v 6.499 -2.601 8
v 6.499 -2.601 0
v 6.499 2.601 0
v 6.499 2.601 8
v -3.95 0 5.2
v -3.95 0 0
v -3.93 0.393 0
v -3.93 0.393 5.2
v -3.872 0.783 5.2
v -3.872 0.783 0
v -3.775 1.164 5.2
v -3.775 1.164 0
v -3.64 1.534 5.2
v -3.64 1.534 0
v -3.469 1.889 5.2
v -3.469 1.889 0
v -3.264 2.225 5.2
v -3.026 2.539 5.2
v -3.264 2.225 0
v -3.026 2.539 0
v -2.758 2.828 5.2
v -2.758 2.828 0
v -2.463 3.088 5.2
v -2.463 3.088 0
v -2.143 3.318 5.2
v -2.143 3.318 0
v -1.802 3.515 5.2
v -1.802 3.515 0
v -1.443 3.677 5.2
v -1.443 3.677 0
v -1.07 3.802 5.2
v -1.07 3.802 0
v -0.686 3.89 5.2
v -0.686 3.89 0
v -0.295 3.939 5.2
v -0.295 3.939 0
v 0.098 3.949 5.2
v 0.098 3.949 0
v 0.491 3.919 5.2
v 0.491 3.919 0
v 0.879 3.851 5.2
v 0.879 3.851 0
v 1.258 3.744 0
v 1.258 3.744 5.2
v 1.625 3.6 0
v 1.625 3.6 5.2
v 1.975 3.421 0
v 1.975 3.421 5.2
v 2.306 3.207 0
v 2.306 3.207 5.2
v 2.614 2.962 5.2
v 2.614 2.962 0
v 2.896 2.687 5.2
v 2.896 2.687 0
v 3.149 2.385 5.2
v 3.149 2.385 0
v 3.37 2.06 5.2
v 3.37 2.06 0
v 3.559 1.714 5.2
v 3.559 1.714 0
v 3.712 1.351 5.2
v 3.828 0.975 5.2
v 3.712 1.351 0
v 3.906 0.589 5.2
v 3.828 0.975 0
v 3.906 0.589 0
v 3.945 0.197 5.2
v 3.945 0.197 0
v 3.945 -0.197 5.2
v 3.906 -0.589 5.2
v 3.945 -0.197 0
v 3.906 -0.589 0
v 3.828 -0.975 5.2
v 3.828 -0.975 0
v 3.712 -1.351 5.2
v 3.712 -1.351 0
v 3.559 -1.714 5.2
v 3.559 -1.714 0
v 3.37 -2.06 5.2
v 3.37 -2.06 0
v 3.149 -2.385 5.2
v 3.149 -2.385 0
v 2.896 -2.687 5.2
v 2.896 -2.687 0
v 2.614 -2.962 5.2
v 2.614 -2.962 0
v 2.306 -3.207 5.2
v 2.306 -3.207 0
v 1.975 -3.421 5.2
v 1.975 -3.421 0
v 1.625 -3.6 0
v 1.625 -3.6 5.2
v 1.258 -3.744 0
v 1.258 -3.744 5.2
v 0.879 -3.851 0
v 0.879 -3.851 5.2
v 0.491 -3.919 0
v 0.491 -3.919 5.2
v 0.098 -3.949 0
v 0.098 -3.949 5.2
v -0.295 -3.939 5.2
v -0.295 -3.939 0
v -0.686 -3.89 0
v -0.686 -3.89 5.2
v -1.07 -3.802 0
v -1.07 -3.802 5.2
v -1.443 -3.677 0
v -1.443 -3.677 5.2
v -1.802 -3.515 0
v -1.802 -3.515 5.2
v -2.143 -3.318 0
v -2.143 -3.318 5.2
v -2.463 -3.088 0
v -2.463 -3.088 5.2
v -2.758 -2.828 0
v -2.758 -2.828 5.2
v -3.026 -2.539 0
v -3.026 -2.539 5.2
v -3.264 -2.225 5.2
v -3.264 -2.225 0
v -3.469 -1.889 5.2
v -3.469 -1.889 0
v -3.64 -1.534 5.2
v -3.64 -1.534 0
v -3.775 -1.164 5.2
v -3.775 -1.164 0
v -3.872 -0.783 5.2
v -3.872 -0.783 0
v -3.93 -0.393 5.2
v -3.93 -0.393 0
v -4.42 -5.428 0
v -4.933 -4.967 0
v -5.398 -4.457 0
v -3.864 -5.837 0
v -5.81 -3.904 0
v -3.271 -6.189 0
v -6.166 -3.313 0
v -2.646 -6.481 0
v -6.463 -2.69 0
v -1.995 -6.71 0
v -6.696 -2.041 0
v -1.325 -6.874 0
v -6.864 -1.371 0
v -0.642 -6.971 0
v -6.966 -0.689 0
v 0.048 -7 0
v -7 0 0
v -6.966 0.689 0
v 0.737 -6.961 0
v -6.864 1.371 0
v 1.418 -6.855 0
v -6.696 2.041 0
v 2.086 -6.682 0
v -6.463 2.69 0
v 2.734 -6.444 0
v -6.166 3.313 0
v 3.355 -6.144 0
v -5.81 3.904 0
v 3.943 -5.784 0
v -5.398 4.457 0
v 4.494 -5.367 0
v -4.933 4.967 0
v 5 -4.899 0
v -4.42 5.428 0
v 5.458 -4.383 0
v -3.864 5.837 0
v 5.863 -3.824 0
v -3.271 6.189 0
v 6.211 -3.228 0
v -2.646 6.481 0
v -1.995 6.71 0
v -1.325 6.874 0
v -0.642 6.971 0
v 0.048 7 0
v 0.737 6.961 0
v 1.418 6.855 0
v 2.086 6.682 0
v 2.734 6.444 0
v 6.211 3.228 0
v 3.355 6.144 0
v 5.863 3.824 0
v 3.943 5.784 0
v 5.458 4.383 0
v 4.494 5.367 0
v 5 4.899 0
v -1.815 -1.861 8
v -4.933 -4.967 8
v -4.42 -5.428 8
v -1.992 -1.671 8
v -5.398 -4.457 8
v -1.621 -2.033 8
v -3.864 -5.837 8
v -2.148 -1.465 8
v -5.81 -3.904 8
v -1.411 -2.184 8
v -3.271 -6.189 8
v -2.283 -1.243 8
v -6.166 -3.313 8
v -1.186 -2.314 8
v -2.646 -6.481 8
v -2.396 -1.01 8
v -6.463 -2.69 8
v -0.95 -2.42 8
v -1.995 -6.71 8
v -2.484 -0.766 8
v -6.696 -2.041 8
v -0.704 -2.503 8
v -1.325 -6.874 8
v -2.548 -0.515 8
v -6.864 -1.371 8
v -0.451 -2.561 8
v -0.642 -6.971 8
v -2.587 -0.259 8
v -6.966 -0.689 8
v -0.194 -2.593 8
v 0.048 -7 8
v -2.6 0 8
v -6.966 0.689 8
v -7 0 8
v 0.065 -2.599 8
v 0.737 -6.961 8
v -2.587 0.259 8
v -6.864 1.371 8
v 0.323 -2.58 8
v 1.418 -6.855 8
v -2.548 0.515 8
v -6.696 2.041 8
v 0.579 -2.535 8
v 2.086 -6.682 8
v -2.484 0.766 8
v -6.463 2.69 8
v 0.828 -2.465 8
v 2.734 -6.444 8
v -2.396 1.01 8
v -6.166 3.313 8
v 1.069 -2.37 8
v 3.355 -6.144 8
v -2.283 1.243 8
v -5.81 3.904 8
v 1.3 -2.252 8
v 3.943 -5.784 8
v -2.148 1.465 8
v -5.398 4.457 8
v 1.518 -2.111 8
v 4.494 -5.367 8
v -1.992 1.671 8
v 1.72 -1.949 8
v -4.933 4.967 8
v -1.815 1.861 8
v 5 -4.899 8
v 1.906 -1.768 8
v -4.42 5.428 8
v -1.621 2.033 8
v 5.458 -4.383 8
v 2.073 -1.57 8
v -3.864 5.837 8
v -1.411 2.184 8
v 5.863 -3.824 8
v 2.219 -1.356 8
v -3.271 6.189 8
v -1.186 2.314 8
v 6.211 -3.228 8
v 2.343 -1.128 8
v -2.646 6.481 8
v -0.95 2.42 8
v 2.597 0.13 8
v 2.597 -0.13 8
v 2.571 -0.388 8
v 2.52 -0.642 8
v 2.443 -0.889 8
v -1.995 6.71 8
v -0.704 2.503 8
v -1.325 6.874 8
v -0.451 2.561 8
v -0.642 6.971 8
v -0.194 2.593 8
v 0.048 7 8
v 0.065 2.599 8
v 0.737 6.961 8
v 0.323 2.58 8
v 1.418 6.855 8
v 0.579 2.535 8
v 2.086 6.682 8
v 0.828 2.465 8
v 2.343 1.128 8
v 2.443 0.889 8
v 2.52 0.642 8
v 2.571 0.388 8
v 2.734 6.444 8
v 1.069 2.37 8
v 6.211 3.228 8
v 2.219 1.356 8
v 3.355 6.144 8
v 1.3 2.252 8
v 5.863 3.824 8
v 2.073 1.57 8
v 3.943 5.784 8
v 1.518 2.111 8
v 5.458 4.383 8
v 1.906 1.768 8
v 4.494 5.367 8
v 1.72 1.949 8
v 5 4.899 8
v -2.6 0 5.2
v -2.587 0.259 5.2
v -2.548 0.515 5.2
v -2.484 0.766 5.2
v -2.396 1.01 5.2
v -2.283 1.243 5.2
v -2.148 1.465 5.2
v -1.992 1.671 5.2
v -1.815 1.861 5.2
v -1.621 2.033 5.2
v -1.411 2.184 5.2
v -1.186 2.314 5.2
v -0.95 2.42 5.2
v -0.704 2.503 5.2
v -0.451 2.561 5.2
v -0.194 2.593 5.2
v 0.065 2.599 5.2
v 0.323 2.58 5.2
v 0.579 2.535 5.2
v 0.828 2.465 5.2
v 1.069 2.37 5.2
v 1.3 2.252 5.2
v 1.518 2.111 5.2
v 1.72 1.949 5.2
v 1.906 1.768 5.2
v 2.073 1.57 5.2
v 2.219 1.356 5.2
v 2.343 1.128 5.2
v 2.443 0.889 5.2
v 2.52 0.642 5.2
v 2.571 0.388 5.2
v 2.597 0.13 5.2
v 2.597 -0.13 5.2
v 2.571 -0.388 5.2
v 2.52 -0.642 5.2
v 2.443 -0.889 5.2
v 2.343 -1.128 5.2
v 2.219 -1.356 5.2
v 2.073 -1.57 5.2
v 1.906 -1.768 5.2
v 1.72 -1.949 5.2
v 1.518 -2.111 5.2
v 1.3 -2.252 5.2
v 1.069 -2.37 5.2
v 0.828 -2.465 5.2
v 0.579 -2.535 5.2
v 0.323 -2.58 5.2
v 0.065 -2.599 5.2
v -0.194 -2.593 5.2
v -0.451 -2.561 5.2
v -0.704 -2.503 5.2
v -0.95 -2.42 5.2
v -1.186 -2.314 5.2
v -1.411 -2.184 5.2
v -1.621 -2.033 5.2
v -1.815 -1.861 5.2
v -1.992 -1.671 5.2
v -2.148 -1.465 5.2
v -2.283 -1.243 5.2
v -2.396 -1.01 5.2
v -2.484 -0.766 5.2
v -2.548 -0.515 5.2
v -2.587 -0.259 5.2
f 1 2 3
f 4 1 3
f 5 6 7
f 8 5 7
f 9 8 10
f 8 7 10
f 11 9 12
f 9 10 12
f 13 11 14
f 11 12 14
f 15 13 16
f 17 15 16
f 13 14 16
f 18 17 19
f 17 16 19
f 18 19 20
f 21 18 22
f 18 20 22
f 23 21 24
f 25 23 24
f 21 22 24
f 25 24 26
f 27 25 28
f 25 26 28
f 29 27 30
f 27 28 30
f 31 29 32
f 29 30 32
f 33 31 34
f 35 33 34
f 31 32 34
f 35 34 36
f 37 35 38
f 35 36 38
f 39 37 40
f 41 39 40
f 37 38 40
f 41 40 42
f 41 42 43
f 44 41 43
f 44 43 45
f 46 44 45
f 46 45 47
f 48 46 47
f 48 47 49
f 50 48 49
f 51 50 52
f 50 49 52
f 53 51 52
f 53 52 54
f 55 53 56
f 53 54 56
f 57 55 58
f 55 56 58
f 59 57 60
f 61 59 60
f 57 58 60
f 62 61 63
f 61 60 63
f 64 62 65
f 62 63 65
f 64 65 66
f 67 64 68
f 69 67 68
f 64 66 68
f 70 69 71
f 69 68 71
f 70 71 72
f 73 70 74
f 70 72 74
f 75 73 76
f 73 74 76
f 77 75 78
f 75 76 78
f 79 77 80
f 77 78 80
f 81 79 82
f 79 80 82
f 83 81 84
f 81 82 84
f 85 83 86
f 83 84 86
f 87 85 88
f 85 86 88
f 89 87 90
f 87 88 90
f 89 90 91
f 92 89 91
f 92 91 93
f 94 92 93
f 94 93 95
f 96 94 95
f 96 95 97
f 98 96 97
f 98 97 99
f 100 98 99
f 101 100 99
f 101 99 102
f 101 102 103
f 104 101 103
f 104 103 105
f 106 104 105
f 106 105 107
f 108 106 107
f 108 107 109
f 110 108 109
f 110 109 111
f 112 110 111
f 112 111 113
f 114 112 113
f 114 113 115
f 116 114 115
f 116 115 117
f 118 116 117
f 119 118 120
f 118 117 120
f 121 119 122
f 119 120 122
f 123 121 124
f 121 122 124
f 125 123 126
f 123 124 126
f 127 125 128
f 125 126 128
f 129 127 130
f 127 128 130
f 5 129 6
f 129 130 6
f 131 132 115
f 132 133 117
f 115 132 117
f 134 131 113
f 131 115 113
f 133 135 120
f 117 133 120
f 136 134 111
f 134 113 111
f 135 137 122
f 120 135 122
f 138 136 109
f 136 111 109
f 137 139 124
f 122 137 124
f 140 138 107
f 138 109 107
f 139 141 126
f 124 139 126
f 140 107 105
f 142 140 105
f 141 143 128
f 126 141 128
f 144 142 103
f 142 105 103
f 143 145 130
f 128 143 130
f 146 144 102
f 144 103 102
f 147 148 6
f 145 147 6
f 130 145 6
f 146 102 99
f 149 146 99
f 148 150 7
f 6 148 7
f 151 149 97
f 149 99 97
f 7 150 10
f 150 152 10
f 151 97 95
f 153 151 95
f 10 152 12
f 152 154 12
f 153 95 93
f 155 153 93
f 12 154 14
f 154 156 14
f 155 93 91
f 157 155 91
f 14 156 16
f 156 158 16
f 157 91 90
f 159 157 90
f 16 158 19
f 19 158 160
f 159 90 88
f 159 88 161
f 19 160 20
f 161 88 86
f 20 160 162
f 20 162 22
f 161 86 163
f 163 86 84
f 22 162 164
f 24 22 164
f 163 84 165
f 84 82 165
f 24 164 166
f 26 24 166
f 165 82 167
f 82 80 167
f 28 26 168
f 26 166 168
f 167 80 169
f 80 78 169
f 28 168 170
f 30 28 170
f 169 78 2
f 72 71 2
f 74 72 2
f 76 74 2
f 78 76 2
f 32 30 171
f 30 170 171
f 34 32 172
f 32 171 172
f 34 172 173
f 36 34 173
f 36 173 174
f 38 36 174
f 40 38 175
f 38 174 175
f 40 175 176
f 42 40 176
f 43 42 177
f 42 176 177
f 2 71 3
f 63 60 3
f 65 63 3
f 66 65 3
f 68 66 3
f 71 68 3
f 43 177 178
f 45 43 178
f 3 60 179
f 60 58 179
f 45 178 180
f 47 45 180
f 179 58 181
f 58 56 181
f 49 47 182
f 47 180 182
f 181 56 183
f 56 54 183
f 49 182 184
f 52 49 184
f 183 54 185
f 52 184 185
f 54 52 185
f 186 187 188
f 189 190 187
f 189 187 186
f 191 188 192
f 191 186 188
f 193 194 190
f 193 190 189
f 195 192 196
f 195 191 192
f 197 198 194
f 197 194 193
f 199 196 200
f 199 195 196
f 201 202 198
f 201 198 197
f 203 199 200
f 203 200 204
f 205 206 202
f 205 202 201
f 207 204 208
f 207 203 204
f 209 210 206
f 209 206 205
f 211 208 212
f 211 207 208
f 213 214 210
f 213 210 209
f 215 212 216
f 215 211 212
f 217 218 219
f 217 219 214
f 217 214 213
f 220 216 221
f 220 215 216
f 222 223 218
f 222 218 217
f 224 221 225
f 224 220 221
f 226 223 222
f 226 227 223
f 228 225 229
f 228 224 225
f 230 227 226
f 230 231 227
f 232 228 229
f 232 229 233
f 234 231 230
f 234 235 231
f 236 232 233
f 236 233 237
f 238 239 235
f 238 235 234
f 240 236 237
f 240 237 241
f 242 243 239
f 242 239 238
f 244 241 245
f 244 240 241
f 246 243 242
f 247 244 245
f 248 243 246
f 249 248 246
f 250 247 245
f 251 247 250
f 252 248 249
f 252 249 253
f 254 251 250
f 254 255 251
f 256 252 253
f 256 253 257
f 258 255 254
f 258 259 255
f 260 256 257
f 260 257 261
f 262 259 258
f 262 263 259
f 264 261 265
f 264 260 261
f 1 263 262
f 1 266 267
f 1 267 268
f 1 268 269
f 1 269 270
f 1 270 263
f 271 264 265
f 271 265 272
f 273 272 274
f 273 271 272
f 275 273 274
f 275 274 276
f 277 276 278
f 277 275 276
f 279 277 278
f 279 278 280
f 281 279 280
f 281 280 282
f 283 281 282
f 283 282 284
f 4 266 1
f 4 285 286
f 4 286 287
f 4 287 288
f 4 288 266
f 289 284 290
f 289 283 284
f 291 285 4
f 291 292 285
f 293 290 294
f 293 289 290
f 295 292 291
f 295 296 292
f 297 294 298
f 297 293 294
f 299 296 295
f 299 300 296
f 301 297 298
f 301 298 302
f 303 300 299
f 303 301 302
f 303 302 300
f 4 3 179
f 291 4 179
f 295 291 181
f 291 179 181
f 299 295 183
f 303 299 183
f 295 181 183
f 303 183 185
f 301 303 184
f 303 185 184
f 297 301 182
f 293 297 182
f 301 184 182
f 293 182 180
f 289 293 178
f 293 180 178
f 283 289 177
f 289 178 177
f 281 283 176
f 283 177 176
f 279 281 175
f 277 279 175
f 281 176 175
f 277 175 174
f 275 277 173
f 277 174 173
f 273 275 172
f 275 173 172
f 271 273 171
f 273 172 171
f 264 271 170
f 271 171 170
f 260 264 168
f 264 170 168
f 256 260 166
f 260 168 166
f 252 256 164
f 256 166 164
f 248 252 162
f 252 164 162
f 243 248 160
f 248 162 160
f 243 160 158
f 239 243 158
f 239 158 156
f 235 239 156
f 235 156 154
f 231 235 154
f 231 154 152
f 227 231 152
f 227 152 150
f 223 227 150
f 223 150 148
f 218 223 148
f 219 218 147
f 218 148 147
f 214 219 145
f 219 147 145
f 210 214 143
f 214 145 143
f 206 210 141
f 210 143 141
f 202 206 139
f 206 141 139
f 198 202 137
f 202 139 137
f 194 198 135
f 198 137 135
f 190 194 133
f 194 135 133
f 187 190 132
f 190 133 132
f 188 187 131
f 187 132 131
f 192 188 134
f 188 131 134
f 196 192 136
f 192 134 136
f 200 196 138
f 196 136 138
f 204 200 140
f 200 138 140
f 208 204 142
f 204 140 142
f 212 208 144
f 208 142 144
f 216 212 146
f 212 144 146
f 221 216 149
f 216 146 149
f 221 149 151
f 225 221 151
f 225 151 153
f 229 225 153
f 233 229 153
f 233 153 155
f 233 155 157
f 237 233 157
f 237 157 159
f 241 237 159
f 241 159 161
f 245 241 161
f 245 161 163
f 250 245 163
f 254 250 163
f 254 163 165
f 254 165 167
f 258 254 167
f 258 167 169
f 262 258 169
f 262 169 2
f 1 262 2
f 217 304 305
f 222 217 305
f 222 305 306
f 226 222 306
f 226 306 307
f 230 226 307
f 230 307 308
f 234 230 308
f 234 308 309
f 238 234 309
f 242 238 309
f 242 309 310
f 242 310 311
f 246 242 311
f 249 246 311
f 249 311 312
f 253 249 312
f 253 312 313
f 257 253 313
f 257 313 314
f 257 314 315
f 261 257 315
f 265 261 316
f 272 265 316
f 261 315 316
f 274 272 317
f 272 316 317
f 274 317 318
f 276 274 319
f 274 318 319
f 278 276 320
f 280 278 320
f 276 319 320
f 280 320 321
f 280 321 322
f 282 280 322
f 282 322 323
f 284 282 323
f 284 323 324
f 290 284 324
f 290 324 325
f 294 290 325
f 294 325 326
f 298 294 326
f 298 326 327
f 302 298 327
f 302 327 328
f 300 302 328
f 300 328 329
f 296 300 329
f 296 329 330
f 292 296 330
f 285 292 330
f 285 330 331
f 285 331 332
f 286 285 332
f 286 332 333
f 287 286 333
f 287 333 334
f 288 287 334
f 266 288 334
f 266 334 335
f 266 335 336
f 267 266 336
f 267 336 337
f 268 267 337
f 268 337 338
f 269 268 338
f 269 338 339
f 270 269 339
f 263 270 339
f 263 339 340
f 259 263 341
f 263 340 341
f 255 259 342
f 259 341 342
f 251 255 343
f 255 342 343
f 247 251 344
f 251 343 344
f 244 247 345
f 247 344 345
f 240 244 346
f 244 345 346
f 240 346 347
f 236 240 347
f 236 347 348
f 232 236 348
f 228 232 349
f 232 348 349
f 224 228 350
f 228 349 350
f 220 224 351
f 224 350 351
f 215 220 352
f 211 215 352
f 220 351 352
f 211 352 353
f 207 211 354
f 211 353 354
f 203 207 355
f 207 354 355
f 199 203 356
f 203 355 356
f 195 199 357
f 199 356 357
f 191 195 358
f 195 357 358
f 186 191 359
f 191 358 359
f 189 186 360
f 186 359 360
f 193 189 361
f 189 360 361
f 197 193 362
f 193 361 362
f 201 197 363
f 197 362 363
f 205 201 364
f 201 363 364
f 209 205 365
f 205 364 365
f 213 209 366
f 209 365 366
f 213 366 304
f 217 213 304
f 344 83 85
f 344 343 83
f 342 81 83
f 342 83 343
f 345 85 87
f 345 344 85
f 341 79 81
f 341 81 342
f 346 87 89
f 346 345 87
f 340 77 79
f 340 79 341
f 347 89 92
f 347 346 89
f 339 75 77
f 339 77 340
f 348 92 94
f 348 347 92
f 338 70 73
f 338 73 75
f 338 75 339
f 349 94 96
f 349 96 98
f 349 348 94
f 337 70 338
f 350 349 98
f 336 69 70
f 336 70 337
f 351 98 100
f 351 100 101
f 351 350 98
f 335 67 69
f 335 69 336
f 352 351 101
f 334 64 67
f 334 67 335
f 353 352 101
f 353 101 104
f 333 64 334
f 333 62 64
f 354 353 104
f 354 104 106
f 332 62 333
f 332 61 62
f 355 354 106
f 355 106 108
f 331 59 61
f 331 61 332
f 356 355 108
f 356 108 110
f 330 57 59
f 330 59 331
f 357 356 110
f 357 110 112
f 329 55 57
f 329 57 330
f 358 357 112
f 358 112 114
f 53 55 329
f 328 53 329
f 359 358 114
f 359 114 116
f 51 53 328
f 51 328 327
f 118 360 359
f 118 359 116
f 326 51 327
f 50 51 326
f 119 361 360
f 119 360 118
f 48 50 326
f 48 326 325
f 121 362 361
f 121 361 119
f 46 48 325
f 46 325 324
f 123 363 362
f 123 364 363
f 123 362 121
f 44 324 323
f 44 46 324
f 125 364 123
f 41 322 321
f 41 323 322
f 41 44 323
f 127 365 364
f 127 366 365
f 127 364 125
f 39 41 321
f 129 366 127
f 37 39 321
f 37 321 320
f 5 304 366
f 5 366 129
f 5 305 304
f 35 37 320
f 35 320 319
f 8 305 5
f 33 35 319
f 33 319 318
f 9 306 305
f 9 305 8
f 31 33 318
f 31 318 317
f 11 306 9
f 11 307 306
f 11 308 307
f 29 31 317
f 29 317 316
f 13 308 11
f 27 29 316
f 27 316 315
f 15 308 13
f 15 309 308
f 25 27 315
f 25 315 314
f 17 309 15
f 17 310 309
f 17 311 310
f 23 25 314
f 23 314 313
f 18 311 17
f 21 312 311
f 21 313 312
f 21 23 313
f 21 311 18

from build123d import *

# Parameters (mm, degrees)
EXTRUDE_1_DEPTH     = 8
SKETCH_2_R          = 3.95
CUT_EXTRUDE_1_DEPTH = 5.2
SKETCH_3_R          = 2.6
CUT_EXTRUDE_2_DEPTH = 5.2


with BuildPart() as part:
    # Эскиз1 → Бобышка-Вытянуть1 (new body)
    with BuildSketch(Plane.XY):
        with BuildLine():
            Line((6.498674865, -2.601389052), (6.498674865, 2.601389052))
            ThreePointArc((6.498674865, 2.601389052), (-7, 0), (6.498674865, -2.601389052))
        make_face()
    extrude(amount=EXTRUDE_1_DEPTH)

    # Эскиз2 → Вырез-Вытянуть1 (cut)
    with BuildSketch(Plane(origin=(0, 0, 0), x_dir=(-1, 0, 0), z_dir=(0, 0, -1))):
        Circle(SKETCH_2_R)
    extrude(amount=-CUT_EXTRUDE_1_DEPTH, mode=Mode.SUBTRACT)

    # Эскиз3 → Вырез-Вытянуть2 (cut)
    with BuildSketch(Plane(origin=(0, 0, 5.2), x_dir=(-1, 0, 0), z_dir=(0, 0, -1))):
        Circle(SKETCH_3_R)
    extrude(amount=-CUT_EXTRUDE_2_DEPTH, mode=Mode.SUBTRACT)


solid = part.part
